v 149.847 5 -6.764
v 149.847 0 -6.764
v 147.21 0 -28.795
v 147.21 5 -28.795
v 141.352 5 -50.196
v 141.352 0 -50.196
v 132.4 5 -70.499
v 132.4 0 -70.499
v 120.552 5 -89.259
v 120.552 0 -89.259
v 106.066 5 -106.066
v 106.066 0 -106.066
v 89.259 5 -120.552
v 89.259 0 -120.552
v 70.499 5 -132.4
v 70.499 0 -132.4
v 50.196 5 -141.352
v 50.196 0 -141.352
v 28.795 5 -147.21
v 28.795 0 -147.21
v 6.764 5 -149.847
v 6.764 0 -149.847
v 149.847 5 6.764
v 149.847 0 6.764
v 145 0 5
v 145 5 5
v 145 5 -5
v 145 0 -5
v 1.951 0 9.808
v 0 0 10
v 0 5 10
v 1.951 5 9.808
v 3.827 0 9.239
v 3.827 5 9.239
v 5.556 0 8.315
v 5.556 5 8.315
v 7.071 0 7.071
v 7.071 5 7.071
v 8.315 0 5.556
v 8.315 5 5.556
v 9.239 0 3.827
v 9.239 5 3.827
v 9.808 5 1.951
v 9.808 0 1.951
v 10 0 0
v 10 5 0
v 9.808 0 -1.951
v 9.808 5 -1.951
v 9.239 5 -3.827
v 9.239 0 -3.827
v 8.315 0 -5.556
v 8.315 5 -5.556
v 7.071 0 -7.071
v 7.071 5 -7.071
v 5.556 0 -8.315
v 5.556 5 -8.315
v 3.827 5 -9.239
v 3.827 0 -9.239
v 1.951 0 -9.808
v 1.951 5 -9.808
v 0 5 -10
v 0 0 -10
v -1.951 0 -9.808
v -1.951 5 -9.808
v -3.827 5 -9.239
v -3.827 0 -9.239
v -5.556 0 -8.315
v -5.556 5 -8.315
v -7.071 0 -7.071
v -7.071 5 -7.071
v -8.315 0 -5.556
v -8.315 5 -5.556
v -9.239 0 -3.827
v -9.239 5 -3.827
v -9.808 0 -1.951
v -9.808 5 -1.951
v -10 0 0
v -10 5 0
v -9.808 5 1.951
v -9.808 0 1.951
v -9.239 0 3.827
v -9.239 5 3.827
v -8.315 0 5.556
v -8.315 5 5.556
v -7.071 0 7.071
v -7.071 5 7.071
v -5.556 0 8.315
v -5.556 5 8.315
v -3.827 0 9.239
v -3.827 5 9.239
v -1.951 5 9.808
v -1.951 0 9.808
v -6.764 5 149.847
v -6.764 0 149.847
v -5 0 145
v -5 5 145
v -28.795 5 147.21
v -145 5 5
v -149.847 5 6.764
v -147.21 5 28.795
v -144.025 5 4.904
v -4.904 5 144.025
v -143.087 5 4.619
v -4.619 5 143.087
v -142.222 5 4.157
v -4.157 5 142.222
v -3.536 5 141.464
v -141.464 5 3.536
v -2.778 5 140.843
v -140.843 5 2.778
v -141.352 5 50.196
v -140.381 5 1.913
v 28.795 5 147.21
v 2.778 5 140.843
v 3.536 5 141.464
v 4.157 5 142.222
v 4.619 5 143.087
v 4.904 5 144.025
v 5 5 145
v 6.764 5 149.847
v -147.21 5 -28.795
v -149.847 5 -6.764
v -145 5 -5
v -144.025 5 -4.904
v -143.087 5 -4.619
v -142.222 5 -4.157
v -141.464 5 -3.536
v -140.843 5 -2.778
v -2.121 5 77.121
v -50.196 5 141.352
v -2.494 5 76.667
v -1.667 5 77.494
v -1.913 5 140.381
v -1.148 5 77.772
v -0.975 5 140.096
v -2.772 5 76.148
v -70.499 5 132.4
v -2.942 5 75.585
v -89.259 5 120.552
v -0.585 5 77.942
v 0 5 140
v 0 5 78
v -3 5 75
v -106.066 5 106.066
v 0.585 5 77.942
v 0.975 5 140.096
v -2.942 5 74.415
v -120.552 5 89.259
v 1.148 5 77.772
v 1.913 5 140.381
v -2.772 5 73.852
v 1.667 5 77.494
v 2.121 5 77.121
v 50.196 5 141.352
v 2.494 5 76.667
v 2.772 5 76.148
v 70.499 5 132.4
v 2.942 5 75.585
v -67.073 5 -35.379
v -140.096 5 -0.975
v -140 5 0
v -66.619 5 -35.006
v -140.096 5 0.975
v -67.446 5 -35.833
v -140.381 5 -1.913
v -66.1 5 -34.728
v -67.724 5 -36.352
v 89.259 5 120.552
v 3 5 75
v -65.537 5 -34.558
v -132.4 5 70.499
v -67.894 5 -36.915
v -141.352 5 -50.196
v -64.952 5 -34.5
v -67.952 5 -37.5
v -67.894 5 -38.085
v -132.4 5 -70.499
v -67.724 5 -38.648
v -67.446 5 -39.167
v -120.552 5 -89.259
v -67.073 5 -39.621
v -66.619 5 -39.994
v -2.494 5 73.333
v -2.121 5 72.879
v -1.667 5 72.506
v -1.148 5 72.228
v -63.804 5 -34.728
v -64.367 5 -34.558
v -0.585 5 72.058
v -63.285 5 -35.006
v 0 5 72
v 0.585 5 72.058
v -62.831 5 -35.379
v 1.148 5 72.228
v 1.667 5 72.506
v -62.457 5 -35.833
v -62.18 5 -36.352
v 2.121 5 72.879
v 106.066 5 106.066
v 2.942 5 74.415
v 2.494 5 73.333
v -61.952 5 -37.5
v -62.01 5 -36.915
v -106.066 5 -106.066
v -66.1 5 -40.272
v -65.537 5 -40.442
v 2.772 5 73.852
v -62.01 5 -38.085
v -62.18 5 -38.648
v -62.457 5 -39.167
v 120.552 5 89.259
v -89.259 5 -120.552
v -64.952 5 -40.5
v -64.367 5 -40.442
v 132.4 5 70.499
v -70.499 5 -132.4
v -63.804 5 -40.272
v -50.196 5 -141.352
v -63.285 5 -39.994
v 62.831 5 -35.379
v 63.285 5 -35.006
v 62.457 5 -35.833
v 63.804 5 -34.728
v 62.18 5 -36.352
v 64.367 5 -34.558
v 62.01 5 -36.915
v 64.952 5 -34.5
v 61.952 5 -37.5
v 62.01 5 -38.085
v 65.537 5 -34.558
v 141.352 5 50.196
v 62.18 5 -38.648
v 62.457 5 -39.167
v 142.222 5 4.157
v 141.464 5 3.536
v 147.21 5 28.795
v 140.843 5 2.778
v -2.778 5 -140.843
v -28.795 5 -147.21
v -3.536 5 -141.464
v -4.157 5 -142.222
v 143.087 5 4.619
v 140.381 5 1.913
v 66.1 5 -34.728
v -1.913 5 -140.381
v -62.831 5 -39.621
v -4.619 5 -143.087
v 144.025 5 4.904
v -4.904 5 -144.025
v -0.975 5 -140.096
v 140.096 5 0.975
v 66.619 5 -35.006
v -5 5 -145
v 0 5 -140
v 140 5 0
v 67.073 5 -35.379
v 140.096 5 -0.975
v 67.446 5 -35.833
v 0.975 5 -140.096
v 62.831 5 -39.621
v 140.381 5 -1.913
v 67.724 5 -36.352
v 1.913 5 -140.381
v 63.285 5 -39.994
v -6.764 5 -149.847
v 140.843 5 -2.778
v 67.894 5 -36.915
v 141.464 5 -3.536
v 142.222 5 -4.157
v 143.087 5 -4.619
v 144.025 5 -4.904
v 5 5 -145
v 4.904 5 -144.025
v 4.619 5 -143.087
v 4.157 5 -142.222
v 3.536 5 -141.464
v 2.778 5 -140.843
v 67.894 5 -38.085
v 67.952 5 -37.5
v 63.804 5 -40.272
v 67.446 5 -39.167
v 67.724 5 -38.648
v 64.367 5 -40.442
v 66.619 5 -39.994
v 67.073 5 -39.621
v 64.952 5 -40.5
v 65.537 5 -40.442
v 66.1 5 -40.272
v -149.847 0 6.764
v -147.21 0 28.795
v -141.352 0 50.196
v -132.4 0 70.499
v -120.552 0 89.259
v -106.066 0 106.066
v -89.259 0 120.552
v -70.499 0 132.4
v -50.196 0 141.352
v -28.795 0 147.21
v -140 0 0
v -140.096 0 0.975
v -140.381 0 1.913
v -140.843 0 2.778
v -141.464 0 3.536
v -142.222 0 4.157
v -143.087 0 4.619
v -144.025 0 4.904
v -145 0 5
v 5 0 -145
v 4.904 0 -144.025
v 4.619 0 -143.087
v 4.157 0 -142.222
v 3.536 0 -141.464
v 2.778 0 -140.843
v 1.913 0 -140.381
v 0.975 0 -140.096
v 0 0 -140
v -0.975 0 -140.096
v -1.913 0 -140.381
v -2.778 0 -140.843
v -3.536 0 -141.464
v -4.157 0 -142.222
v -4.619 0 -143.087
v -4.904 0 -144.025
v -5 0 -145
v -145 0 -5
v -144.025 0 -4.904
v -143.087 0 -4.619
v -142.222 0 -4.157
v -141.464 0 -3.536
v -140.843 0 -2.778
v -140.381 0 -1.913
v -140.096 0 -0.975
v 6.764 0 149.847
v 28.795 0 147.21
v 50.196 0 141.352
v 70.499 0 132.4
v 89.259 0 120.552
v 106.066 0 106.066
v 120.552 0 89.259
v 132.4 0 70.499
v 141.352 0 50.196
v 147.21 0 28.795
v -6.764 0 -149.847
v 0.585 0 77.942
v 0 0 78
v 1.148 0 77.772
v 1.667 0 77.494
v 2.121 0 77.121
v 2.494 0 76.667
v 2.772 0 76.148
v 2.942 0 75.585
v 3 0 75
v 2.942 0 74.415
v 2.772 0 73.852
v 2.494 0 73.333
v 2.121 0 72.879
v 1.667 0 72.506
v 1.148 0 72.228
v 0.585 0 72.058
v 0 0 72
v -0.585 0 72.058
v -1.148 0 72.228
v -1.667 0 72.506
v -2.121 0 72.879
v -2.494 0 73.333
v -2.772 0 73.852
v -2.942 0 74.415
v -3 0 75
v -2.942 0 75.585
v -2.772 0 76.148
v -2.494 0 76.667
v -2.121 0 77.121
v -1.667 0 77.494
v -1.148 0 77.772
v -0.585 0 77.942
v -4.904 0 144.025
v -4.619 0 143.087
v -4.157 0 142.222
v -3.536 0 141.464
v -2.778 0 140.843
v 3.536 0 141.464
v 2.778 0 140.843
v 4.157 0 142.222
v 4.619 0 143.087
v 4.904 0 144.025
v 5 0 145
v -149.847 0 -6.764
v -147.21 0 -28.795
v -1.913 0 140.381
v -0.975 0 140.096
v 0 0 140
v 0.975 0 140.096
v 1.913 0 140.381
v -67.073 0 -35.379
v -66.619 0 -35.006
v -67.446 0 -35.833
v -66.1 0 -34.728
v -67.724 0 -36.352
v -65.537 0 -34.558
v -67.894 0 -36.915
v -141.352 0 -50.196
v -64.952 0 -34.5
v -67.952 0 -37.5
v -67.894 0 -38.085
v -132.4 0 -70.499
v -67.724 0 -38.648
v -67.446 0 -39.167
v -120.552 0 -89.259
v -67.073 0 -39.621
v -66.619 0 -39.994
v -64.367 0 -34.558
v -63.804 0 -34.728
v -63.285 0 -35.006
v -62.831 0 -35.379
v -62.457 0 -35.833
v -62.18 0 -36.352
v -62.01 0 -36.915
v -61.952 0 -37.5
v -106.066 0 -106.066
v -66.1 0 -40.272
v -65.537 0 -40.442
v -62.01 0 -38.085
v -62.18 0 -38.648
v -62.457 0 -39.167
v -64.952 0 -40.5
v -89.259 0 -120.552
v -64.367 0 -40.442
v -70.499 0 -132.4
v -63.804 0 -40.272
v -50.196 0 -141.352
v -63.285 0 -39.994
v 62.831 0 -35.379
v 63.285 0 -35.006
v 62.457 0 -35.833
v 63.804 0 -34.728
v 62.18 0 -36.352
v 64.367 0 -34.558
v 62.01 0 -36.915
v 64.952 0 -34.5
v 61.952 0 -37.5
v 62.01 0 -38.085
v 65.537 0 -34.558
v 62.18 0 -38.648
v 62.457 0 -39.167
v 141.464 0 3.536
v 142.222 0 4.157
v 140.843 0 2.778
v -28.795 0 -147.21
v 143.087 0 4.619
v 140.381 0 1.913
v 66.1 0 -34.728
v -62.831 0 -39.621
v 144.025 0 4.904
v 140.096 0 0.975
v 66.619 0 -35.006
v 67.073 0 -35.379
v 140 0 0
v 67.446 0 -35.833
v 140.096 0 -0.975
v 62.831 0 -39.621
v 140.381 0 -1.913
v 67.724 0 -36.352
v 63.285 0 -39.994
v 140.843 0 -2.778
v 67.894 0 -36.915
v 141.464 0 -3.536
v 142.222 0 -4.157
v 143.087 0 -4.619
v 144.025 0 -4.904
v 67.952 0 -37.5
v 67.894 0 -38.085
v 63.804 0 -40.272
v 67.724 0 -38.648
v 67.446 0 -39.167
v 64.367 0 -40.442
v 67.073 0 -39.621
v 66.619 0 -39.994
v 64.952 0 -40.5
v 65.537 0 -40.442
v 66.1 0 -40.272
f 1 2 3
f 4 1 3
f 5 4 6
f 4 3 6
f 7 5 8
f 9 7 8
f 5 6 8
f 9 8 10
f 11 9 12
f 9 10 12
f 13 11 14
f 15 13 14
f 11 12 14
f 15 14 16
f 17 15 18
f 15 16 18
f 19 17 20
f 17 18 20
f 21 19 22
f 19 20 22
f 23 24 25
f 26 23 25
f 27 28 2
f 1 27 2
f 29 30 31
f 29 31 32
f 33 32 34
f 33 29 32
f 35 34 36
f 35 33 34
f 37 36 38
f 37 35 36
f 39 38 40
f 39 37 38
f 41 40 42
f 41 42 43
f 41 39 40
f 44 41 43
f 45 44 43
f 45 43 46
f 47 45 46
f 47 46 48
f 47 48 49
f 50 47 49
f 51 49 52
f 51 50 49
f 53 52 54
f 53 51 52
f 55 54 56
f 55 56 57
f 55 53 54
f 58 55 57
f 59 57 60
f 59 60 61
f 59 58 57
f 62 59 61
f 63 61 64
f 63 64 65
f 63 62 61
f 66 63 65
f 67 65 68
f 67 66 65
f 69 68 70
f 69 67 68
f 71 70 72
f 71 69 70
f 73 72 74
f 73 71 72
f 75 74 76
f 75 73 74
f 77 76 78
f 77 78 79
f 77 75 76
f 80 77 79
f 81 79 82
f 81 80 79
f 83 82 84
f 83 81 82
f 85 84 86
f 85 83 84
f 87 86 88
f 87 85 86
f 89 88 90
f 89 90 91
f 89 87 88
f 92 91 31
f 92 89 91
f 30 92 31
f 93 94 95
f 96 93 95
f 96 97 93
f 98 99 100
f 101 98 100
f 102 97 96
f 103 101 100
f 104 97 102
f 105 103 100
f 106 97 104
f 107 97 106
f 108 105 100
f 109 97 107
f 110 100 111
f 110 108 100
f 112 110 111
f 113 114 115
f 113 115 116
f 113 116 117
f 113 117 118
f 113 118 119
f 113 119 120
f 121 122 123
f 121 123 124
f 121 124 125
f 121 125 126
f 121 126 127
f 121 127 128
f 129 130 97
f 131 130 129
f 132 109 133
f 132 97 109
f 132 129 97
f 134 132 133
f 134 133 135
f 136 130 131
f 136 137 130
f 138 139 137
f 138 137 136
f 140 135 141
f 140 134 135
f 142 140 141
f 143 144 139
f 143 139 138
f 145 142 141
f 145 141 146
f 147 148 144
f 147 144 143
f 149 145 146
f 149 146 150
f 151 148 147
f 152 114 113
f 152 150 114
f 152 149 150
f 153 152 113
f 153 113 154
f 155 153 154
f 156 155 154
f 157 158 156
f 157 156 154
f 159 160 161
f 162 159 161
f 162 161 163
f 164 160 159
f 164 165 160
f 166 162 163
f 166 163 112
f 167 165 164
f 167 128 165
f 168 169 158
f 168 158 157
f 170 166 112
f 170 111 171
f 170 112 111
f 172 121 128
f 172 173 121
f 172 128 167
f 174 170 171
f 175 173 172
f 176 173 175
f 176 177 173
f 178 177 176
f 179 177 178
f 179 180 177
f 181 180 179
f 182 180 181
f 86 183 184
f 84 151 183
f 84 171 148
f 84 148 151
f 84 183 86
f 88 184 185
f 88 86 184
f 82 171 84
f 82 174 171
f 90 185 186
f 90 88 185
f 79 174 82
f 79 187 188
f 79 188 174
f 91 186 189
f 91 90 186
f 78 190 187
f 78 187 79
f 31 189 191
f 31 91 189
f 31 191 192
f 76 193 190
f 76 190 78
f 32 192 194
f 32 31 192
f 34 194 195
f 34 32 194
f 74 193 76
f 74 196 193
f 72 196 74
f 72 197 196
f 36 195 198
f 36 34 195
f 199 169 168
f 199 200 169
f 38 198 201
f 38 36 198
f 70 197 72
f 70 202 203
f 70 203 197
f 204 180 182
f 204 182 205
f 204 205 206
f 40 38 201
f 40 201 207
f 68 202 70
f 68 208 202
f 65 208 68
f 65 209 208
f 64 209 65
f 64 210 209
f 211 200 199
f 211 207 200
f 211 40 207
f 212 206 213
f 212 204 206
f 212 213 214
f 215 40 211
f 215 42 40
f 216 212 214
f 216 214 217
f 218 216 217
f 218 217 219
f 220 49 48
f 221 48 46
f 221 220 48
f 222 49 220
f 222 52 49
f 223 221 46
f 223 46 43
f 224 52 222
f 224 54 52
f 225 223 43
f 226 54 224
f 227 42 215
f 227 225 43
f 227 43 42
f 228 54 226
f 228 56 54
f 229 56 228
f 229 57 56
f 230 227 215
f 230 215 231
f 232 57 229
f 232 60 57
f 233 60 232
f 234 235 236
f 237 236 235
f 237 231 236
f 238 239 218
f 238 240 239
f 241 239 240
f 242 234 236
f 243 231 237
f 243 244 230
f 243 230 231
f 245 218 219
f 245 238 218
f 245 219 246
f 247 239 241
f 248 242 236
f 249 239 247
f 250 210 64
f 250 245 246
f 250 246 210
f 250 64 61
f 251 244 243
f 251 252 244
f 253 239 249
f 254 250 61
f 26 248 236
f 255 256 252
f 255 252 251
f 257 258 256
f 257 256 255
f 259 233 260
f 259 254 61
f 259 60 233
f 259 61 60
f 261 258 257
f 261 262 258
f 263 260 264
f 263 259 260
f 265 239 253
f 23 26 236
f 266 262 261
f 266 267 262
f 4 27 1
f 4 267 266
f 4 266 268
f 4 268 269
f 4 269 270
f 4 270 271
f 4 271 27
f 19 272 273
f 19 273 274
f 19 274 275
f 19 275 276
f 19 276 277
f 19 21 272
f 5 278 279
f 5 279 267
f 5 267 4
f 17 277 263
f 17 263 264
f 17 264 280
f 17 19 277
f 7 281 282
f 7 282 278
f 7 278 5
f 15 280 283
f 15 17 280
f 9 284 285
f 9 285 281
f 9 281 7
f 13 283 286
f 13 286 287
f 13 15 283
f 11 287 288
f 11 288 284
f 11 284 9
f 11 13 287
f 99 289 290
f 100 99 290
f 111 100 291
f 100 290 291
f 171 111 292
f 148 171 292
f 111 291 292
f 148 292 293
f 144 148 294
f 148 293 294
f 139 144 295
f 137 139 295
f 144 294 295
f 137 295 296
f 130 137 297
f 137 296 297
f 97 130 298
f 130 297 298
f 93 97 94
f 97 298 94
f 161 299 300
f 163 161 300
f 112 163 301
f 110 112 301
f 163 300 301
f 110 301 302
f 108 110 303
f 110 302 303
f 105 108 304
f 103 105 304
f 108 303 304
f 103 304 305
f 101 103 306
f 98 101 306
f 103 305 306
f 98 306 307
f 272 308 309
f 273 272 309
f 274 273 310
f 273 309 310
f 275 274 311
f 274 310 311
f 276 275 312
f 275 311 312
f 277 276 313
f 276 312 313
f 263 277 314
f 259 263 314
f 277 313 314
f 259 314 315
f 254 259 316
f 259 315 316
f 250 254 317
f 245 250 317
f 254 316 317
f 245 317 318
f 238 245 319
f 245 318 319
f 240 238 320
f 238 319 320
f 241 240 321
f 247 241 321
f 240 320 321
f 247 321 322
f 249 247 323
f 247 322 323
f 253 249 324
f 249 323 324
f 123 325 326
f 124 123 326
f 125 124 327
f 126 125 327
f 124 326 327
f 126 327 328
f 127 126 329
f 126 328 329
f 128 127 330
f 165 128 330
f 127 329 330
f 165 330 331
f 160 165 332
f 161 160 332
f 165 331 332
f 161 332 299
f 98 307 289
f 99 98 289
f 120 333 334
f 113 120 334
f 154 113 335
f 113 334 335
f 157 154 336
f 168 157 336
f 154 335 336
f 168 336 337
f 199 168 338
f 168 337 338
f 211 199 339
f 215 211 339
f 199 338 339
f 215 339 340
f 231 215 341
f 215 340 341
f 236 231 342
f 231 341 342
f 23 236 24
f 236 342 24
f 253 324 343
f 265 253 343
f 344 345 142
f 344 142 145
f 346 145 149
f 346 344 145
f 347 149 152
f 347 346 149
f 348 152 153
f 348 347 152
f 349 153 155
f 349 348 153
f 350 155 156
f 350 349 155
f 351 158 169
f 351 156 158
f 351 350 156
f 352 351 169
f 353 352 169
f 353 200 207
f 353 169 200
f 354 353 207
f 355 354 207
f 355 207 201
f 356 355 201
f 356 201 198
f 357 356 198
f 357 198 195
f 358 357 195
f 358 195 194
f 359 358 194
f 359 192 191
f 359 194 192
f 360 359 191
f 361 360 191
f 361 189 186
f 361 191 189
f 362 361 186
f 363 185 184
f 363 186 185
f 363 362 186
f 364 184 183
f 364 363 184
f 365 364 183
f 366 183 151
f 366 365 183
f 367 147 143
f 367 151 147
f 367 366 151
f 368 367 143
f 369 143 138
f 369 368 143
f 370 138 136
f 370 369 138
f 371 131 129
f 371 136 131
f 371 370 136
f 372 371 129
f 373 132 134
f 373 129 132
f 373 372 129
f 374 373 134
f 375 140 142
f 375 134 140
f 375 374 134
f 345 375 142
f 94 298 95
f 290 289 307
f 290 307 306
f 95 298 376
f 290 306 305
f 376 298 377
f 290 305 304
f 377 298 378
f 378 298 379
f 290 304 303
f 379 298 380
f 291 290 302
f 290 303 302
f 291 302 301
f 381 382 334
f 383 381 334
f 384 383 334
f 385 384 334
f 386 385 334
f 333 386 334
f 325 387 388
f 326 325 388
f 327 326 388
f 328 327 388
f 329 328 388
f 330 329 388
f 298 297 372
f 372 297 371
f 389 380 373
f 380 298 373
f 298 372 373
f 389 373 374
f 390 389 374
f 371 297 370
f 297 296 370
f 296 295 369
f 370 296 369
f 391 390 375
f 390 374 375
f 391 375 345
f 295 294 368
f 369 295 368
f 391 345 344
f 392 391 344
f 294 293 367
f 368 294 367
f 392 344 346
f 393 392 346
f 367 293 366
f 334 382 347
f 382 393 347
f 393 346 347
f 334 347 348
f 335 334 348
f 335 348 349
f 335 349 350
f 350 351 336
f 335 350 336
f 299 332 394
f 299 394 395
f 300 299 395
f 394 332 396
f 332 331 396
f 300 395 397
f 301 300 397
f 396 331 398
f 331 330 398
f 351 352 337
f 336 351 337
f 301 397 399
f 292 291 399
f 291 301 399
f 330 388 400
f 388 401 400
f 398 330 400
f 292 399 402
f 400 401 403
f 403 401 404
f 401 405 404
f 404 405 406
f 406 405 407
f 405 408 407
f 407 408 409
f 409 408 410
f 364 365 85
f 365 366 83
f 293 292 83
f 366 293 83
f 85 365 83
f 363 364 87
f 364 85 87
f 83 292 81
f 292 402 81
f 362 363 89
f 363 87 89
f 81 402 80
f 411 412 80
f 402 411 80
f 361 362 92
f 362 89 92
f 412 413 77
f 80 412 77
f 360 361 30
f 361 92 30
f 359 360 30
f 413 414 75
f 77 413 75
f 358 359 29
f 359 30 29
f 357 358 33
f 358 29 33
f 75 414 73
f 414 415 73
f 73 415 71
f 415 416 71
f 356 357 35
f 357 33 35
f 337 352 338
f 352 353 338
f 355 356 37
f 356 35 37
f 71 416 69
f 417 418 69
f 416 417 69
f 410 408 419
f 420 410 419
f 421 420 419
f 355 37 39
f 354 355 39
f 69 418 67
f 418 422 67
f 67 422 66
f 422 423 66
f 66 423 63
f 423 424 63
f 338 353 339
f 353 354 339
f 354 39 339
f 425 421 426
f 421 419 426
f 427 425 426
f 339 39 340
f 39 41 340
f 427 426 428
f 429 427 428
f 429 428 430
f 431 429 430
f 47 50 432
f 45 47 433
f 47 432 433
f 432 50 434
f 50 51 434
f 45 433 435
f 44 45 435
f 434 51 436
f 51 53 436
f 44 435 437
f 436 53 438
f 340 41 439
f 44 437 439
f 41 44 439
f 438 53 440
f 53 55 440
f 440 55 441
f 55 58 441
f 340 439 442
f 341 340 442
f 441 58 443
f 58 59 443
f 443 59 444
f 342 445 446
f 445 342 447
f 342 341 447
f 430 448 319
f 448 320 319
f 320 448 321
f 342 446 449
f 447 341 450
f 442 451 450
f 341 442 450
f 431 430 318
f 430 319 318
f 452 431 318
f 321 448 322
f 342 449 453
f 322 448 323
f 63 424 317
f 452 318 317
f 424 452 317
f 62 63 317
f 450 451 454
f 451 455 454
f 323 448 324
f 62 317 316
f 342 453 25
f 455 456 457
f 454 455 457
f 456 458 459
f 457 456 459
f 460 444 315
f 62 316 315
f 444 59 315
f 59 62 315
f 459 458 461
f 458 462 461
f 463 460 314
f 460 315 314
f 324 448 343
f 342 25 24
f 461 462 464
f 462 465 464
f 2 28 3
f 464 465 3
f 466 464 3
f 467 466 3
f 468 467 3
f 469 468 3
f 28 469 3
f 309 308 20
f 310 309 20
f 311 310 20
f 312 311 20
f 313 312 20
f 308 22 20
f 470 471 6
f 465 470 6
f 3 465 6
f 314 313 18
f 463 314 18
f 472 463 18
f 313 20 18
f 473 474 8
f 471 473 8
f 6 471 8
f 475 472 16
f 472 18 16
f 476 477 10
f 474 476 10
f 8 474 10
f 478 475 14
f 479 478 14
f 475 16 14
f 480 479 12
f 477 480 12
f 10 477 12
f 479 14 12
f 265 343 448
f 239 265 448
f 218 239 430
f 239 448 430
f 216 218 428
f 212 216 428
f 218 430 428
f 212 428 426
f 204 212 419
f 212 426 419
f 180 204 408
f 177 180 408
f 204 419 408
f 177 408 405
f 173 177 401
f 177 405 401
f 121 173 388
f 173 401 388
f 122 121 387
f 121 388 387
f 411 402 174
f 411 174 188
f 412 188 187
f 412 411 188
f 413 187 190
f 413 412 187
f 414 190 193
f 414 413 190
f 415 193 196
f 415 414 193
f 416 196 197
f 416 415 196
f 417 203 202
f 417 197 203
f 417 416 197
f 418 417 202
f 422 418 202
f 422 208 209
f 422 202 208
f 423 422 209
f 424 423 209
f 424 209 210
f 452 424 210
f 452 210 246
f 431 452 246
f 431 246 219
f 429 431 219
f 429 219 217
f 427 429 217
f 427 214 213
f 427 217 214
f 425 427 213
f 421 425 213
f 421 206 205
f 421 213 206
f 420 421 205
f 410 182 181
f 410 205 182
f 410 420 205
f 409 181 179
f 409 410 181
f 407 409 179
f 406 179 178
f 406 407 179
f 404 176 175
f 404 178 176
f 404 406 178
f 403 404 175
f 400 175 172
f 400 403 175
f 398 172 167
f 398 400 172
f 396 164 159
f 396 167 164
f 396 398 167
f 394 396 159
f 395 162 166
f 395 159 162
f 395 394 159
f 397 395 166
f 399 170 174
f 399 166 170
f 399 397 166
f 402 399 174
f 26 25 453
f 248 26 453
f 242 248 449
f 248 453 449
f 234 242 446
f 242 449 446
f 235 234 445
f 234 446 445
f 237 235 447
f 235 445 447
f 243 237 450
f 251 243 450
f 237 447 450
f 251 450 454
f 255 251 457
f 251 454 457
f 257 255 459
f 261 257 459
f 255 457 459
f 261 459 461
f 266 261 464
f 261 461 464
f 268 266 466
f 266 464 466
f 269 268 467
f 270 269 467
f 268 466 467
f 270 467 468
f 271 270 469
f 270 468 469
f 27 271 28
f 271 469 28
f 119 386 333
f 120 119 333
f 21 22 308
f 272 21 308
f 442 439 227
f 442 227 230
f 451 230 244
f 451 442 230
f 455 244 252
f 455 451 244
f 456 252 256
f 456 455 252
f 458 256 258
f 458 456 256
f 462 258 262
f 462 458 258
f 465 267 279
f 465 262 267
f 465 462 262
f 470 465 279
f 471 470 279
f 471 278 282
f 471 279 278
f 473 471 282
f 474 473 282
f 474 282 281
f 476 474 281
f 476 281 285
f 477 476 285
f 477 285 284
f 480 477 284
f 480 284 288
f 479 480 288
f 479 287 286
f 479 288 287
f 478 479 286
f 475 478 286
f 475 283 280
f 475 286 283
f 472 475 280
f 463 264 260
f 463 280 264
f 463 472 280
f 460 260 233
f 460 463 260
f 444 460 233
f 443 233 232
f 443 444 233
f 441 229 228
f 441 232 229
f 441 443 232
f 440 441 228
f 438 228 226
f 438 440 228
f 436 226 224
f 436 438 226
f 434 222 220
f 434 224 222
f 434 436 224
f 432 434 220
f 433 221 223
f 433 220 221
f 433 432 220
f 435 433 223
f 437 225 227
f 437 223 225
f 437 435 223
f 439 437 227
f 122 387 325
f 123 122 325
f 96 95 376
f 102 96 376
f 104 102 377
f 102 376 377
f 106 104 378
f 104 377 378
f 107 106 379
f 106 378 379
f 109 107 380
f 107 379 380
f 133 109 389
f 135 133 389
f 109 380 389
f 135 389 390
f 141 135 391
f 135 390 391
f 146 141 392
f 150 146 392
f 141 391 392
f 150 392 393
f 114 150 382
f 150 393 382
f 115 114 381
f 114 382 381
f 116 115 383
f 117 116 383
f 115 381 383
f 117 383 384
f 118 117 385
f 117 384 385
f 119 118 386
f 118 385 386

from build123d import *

# Parameters (mm, degrees)
SKETCH1_R               = 10
BOSS_EXTRUDE1_DEPTH     = 5
CUT_EXTRUDE1_DEPTH      = 212.975206598
CUT_EXTRUDE1_DEPTH_BACK = 212.975206598
SKETCH2_R               = 3


with BuildPart() as part:
    # Sketch1 → Boss-Extrude1 (new body)
    with BuildSketch(Plane(origin=(0, 0, 0), x_dir=(1, 0, 0), z_dir=(0, 1, 0))):
        with BuildLine():
            ThreePointArc((5, 145), (0, 140), (-5, 145))
            Line((-5, 145), (-6.764310309, 149.847402734))
            ThreePointArc((-6.764310309, 149.847402734), (-106.066017178, 106.066017178), (-149.847402734, 6.764310309))
            Line((-149.847402734, 6.764310309), (-145, 5))
            ThreePointArc((-145, 5), (-141.464466094, 3.535533906), (-140, 0))
            ThreePointArc((-140, 0), (-141.464466094, -3.535533906), (-145, -5))
            Line((-145, -5), (-149.847402734, -6.764310309))
            ThreePointArc((-149.847402734, -6.764310309), (-106.066017178, -106.066017178), (-6.764310309, -149.847402734))
            Line((-6.764310309, -149.847402734), (-5, -145))
            ThreePointArc((-5, -145), (0, -140), (5, -145))
            Line((5, -145), (6.764310309, -149.847402734))
            ThreePointArc((6.764310309, -149.847402734), (106.066017178, -106.066017178), (149.847402734, -6.764310309))
            Line((149.847402734, -6.764310309), (145, -5))
            ThreePointArc((145, -5), (140, 0), (145, 5))
            Line((145, 5), (149.847402734, 6.764310309))
            ThreePointArc((149.847402734, 6.764310309), (106.066017178, 106.066017178), (6.764310309, 149.847402734))
            Line((6.764310309, 149.847402734), (5, 145))
        make_face()
        with Locations(Location((0, 0, 0), (0, 0, 270))):
            Circle(SKETCH1_R, mode=Mode.SUBTRACT)
    extrude(amount=BOSS_EXTRUDE1_DEPTH)

    # Sketch2 → Cut-Extrude1 (cut, two sides: drawn at the far end of the back side and taken through both)
    with BuildSketch(Plane(origin=(0, 5, 0), x_dir=(1, 0, 0), z_dir=(0, 1, 0)).offset(-CUT_EXTRUDE1_DEPTH_BACK)):
        with Locations(Location((0, -75, 0), (0, 0, 270))):
            Circle(SKETCH2_R)
        with Locations(Location((64.951905284, 37.5, 0), (0, 0, 270))):
            Circle(SKETCH2_R)
        with Locations(Location((-64.951905284, 37.5, 0), (0, 0, 270))):
            Circle(SKETCH2_R)
    extrude(amount=CUT_EXTRUDE1_DEPTH + CUT_EXTRUDE1_DEPTH_BACK, mode=Mode.SUBTRACT)


solid = part.part
